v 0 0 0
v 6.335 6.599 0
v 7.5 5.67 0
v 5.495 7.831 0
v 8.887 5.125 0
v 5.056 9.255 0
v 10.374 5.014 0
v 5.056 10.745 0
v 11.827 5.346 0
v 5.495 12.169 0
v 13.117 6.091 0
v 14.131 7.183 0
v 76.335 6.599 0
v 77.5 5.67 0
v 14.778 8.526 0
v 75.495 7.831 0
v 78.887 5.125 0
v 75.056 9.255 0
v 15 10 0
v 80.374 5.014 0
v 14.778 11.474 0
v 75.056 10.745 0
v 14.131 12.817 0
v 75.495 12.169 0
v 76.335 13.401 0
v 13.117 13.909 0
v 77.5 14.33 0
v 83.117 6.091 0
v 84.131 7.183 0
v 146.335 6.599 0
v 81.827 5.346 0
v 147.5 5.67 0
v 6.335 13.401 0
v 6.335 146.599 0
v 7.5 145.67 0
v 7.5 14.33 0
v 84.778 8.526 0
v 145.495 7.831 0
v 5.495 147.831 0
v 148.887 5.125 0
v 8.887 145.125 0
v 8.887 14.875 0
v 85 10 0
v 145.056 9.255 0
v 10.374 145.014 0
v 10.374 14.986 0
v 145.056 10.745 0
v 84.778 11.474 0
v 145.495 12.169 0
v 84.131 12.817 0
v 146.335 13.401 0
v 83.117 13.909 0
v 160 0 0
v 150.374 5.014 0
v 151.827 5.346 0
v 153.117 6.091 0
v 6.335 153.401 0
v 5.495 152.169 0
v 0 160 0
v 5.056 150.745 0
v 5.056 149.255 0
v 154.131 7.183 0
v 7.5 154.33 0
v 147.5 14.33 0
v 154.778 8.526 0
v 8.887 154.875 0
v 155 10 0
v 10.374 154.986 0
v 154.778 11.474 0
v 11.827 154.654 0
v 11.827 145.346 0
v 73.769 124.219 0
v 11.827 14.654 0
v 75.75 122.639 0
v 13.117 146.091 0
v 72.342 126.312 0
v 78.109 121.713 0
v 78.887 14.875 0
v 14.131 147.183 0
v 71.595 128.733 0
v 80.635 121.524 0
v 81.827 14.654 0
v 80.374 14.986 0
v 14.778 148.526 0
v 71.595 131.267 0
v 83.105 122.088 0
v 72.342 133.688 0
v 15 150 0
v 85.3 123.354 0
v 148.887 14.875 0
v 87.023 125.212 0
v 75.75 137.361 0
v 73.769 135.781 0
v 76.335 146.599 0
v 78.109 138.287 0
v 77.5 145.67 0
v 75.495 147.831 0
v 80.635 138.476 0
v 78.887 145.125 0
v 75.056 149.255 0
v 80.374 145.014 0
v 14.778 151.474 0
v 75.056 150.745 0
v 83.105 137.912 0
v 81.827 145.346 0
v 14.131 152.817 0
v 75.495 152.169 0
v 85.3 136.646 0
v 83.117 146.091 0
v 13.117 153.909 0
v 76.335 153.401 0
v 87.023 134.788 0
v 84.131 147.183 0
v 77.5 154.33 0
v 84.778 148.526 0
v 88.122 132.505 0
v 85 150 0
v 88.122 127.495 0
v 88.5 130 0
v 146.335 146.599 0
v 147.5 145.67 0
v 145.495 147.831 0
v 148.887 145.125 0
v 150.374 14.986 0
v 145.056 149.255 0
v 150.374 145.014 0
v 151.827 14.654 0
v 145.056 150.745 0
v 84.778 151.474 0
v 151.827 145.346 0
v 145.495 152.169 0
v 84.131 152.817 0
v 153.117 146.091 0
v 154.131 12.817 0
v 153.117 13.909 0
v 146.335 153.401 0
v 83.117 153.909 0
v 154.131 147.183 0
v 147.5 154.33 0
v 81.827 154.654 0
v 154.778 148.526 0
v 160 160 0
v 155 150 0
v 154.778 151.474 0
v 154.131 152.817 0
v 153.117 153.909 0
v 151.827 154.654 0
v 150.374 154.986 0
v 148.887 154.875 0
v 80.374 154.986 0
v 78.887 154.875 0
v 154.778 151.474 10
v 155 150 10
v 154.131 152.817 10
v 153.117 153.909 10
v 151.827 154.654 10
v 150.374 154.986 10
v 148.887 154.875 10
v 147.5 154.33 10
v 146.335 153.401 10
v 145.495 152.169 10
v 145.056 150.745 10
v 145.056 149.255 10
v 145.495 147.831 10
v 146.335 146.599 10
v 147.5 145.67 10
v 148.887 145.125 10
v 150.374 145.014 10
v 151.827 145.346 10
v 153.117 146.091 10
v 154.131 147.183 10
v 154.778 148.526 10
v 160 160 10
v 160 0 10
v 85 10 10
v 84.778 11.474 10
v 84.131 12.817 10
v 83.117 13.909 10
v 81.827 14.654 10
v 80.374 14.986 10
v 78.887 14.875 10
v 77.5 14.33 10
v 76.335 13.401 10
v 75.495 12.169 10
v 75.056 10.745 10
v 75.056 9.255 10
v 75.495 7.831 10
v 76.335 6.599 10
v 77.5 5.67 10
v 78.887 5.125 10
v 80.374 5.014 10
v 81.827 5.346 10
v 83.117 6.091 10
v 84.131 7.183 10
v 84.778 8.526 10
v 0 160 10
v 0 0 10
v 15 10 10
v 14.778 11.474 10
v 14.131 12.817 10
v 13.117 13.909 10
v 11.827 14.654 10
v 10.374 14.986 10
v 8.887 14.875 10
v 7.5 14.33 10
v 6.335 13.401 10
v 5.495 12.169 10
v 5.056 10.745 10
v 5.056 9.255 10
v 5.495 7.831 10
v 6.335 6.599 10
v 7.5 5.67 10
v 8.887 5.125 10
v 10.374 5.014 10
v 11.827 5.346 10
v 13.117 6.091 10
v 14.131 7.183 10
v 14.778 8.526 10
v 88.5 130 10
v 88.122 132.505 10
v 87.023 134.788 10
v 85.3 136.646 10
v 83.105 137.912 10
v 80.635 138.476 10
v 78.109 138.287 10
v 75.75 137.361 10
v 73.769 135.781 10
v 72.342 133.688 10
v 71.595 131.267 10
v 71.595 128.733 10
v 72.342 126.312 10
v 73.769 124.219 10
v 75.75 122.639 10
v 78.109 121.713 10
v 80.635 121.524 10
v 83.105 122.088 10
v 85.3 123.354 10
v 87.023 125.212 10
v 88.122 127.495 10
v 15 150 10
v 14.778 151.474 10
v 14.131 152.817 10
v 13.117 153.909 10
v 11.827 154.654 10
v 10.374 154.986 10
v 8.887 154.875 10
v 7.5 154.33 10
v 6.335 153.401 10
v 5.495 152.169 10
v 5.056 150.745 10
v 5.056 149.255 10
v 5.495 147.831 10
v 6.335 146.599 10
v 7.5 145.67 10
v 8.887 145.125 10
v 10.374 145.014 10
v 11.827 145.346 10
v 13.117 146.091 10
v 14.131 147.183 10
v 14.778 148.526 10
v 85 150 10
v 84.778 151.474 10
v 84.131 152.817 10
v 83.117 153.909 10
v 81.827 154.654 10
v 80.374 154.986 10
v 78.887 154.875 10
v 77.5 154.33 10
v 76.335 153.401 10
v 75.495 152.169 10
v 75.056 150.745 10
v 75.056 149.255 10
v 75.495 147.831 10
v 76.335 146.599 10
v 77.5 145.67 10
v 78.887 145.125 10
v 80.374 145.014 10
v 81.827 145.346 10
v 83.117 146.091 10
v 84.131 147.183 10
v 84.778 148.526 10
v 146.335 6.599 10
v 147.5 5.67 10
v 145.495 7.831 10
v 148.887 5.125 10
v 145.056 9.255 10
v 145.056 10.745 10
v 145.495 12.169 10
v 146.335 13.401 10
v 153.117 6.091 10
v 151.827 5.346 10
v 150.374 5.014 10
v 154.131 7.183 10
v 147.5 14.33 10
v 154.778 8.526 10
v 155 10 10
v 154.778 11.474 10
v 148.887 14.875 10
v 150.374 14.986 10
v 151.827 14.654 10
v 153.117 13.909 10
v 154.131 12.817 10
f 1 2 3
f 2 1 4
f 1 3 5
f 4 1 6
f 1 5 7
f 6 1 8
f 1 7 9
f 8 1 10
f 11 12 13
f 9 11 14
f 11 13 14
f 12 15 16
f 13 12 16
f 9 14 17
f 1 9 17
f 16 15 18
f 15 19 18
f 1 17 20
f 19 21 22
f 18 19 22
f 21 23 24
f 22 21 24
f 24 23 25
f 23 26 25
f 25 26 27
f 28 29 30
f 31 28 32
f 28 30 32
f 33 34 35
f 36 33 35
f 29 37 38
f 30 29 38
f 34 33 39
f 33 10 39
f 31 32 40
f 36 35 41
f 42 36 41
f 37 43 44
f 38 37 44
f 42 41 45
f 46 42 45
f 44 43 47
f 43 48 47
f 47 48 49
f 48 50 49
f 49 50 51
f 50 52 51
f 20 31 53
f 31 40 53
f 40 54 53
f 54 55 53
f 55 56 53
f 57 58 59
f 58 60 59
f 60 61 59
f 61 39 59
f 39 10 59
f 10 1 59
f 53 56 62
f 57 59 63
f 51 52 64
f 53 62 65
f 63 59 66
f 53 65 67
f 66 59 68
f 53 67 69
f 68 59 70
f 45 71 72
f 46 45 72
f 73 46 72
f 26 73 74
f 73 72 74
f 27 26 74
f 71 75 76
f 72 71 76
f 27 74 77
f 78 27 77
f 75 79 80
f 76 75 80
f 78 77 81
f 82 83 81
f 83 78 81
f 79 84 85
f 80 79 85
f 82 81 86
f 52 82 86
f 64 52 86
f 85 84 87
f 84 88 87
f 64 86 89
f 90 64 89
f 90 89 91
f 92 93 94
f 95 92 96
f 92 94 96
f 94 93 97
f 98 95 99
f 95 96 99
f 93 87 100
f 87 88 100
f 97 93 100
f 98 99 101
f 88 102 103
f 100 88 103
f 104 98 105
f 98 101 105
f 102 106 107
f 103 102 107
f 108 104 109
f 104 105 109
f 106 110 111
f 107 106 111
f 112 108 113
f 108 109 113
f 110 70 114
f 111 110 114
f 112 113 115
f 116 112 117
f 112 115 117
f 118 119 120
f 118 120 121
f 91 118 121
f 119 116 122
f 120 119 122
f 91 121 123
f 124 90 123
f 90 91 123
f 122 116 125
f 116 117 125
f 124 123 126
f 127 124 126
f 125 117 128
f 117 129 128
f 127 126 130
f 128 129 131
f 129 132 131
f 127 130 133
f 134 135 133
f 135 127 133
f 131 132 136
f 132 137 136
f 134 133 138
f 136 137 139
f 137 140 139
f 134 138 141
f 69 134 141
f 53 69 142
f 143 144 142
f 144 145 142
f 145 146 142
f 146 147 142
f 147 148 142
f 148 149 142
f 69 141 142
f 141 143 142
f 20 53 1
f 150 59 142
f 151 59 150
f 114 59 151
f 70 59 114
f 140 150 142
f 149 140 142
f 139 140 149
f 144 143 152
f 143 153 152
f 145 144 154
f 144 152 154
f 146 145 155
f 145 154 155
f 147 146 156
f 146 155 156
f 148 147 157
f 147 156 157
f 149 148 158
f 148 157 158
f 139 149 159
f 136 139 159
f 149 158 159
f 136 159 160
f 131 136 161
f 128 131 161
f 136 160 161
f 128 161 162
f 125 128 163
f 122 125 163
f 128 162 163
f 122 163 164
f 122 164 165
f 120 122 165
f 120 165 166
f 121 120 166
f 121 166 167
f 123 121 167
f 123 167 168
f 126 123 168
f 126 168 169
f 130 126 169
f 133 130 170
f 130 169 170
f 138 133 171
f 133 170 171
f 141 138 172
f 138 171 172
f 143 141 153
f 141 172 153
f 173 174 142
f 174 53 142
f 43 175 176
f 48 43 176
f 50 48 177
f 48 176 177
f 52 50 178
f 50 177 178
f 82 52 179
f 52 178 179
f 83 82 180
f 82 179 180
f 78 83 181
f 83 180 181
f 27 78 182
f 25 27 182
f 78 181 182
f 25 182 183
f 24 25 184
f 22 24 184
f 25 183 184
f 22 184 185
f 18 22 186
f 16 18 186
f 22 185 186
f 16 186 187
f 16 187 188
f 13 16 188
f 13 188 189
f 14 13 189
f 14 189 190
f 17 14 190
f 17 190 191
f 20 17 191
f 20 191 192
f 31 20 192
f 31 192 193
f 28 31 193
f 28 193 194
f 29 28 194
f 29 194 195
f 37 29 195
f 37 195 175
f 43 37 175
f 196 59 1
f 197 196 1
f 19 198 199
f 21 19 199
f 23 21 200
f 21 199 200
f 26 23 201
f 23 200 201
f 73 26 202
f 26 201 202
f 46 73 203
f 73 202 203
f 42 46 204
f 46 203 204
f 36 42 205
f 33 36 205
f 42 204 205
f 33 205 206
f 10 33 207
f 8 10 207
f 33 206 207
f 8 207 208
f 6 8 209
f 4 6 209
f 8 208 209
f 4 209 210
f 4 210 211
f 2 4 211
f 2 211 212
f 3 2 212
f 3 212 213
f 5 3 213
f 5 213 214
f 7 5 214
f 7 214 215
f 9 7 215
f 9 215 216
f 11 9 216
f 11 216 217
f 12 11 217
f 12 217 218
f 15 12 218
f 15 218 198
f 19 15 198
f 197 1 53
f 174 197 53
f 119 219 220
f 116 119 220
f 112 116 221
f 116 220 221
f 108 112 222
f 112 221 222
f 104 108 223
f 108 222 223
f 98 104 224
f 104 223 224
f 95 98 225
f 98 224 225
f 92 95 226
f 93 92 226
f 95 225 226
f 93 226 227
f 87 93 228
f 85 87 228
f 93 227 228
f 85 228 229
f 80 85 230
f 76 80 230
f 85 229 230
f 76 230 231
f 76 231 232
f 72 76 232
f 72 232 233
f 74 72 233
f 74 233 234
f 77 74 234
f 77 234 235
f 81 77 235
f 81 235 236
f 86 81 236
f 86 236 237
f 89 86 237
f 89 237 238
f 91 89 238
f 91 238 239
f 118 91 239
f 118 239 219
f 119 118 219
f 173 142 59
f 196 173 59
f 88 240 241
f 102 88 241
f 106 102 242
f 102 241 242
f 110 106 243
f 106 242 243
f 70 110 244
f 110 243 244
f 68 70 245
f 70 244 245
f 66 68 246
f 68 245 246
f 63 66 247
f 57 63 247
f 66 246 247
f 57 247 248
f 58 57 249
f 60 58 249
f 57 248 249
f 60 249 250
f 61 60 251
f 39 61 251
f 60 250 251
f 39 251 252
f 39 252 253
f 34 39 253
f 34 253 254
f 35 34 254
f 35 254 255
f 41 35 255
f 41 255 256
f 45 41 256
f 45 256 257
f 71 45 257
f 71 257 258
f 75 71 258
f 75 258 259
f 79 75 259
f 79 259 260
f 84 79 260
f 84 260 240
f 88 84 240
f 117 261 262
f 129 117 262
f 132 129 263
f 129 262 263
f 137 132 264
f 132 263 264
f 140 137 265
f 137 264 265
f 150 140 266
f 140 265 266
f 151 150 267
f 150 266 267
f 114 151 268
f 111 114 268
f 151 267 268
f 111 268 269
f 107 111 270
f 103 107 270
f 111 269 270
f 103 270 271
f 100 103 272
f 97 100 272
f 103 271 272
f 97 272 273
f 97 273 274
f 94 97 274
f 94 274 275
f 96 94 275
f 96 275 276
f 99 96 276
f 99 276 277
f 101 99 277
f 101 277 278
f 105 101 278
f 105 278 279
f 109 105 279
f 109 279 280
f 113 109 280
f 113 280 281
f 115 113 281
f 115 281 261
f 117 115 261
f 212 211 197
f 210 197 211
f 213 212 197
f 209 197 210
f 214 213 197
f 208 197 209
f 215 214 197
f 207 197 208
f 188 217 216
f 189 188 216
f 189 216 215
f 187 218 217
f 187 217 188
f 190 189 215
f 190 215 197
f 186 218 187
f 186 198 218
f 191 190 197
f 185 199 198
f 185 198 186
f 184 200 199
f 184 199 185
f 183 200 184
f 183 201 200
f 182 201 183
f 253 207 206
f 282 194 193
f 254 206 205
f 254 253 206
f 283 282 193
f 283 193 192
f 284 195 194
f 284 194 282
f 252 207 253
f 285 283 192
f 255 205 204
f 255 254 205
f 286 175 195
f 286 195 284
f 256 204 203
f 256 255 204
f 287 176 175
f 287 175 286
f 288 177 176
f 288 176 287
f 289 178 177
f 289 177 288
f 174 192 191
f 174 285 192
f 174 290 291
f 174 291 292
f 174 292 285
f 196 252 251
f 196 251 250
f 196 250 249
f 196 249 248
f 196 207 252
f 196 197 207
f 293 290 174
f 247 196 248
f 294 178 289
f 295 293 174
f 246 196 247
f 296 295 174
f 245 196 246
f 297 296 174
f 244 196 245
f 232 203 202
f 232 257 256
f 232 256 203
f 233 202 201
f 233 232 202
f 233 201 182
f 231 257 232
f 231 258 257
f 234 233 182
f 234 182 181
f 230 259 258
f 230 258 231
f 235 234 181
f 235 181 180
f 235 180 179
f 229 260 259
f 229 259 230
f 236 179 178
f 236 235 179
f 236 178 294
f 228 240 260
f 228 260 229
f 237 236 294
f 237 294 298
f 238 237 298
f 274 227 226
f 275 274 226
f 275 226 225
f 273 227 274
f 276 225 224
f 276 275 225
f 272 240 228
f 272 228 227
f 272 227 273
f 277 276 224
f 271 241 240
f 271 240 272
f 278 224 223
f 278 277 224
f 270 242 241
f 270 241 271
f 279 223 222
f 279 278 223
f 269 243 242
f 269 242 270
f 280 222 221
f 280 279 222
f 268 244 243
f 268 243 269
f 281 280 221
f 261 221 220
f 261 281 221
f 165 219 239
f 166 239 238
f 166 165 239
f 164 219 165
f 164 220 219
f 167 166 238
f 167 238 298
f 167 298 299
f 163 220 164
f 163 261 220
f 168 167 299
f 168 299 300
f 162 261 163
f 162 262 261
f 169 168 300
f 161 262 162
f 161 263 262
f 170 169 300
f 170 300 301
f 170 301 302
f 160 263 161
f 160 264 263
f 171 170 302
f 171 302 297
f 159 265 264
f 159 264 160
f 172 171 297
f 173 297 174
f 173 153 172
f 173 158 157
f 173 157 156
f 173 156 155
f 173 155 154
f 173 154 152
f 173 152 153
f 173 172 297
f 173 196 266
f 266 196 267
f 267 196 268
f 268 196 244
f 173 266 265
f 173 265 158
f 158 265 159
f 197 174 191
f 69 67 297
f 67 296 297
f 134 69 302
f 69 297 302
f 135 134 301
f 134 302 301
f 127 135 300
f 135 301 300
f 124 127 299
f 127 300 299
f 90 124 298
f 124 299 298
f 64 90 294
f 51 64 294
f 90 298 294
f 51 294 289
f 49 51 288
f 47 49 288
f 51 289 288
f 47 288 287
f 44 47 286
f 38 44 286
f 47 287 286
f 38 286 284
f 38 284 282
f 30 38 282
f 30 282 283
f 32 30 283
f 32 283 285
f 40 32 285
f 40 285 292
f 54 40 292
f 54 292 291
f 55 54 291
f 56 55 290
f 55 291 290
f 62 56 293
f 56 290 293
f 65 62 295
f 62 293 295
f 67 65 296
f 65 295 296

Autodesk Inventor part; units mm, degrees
ref_plane "YZ Plane" through (0, 0, 0) normal (1, 0, 0) x (0, 1, 0)
ref_plane "XZ Plane" through (0, 0, 0) normal (0, 1, 0) x (-1, 0, 0)
ref_plane "XY Plane" through (0, 0, 0) normal (0, 0, 1) x (1, 0, 0)
sketch "Sketch1" plane through (0, 0, 0) normal (0, 0, 1) x (1, 0, 0)
  line L0 (0, 0) -> (160, 0)
  line L1 (160, 0) -> (160, 160)
  line L2 (160, 160) -> (0, 160)
  line L3 (0, 160) -> (0, 0)
  line L4 (0, 160) -> (10, 160)
  dimension "d0" = 160
  dimension "d1" = 160
extrude "Extrusion1" add sketch "Sketch1" along normal blind 10
sketch "Sketch2" plane through (0, 0, 10) normal (0, 0, 1) x (1, 0, 0)
  line L0 (0, 0) -> (0, 10)
  line L1 (0, 160) -> (0, 0) projected
  line L2 (0, 10) -> (0, 160)
  line L3 (0, 160) -> (150, 160)
  line L4 (160, 160) -> (0, 160) projected
  line L5 (150, 160) -> (150, 10)
  line L6 (150, 10) -> (0, 10)
  line L7 (0, 10) -> (0, 160)
  line L8 (0, 160) -> (10, 160)
  line L9 (10, 160) -> (10, 10)
  line L10 (10, 10) -> (150, 10)
  line L11 (150, 160) -> (150, 150)
  line L12 (10, 160) -> (10, 150)
  line L13 (10, 150) -> (150, 150)
  circle A0 centre (10, 150) radius 5
  circle A1 centre (150, 150) radius 5
  circle A2 centre (10, 10) radius 5
  circle A3 centre (150, 10) radius 5
  dimension "d4" = 10
  dimension "d5" = 150
  dimension "d6" = 150
  dimension "d7" = 150
  dimension "d8" = 150
  dimension "d9" = 150
  dimension "d10" = 10
  dimension "d11" = 150
  dimension "d12" = 10
  dimension "d13" = 10
  dimension "d14" = 10
  dimension "d15" = 10
  dimension "d16" = 10
extrude "Extrusion2" cut sketch "Sketch2" against normal through all contours A2 L9 L6 | L6 A2 | A0 L13 L9 | L9 A0 | L9 A2 L6 | A1 L5 | L5 L13 A1 | L13 A0 L9 | A3 L5 L6 | L6 L5 A3 | L5 A1 L13
sketch "Sketch3" plane through (0, 0, 10) normal (0, 0, 1) x (1, 0, 0)
  line L0 (0, 160) -> (0, 0) projected
  line L1 (0, 0) -> (80, 0)
  line L2 (0, 0) -> (160, 0) projected
  line L3 (80, 0) -> (80, 10)
  line L4 (80, 10) -> (80, 150)
  circle A0 centre (80, 10) radius 5
  circle A1 centre (80, 150) radius 5
  dimension "d19" = 80
  dimension "d20" = 10
  dimension "d21" = 140
  dimension "d22" = 10
  dimension "d23" = 10
extrude "Extrusion3" cut sketch "Sketch3" against normal through all
sketch "Sketch4" plane through (0, 0, 10) normal (0, 0, 1) x (1, 0, 0)
  line L0 (160, 160) -> (0, 160) projected
  line L1 (0, 160) -> (80, 160)
  line L2 (80, 160) -> (80, 130)
  circle A0 centre (80, 130) radius 8.5
  point P0 (0, 0)
  dimension "d26" = 80
  dimension "d27" = 30
  dimension "d28" = 17
extrude "Extrusion4" cut sketch "Sketch4" against normal through all
properties part number "2 nd part of capping syatem"
